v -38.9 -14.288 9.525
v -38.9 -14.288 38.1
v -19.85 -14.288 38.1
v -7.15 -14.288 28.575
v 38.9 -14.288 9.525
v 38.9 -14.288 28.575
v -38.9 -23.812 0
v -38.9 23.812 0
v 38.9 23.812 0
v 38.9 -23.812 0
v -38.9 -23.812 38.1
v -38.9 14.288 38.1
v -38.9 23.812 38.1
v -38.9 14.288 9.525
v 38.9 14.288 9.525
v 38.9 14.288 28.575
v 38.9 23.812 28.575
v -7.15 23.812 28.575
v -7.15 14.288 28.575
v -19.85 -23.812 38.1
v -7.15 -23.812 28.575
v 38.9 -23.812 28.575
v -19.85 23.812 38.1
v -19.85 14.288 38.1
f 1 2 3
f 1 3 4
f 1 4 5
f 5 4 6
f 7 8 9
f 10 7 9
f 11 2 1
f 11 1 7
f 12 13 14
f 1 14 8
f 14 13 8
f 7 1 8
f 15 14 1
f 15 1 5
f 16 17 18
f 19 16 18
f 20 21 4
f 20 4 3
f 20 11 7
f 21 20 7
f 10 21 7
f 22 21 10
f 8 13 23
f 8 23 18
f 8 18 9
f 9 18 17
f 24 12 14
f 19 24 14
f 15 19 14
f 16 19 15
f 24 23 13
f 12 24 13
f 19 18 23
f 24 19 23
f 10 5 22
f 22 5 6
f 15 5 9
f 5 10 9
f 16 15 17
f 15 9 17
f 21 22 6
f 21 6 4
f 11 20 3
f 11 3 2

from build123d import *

# Parameters (mm, degrees)
F0_W     = 77.8002
F0_H     = 47.625
F1_DEPTH = 9.525
F3_DEPTH = 9.525


# Not quite as in the source:
# - a pattern or mirror of a feature is missing from the dataset's text; its kind, count and spacing are read off the source's solid


with BuildPart() as f1:
    # F0 (on Top) → F1 (new body)
    with BuildSketch(Plane.XY):
        Rectangle(F0_W, F0_H)
    extrude(amount=F1_DEPTH)

    # F2 (on face) → F3 (join)
    with BuildSketch(Plane.XZ.offset(23.8125)):
        Polygon((-38.9001, 38.1), (-38.9001, 9.525), (38.9001, 9.525), (38.9001, 28.575), (-7.1501, 28.575), (-19.8501, 38.1), align=None)
    f3 = extrude(amount=-F3_DEPTH)

    # F3_copies: F3 across plane
    add(f3.mirror(Plane.ZX))


solid = f1.part
